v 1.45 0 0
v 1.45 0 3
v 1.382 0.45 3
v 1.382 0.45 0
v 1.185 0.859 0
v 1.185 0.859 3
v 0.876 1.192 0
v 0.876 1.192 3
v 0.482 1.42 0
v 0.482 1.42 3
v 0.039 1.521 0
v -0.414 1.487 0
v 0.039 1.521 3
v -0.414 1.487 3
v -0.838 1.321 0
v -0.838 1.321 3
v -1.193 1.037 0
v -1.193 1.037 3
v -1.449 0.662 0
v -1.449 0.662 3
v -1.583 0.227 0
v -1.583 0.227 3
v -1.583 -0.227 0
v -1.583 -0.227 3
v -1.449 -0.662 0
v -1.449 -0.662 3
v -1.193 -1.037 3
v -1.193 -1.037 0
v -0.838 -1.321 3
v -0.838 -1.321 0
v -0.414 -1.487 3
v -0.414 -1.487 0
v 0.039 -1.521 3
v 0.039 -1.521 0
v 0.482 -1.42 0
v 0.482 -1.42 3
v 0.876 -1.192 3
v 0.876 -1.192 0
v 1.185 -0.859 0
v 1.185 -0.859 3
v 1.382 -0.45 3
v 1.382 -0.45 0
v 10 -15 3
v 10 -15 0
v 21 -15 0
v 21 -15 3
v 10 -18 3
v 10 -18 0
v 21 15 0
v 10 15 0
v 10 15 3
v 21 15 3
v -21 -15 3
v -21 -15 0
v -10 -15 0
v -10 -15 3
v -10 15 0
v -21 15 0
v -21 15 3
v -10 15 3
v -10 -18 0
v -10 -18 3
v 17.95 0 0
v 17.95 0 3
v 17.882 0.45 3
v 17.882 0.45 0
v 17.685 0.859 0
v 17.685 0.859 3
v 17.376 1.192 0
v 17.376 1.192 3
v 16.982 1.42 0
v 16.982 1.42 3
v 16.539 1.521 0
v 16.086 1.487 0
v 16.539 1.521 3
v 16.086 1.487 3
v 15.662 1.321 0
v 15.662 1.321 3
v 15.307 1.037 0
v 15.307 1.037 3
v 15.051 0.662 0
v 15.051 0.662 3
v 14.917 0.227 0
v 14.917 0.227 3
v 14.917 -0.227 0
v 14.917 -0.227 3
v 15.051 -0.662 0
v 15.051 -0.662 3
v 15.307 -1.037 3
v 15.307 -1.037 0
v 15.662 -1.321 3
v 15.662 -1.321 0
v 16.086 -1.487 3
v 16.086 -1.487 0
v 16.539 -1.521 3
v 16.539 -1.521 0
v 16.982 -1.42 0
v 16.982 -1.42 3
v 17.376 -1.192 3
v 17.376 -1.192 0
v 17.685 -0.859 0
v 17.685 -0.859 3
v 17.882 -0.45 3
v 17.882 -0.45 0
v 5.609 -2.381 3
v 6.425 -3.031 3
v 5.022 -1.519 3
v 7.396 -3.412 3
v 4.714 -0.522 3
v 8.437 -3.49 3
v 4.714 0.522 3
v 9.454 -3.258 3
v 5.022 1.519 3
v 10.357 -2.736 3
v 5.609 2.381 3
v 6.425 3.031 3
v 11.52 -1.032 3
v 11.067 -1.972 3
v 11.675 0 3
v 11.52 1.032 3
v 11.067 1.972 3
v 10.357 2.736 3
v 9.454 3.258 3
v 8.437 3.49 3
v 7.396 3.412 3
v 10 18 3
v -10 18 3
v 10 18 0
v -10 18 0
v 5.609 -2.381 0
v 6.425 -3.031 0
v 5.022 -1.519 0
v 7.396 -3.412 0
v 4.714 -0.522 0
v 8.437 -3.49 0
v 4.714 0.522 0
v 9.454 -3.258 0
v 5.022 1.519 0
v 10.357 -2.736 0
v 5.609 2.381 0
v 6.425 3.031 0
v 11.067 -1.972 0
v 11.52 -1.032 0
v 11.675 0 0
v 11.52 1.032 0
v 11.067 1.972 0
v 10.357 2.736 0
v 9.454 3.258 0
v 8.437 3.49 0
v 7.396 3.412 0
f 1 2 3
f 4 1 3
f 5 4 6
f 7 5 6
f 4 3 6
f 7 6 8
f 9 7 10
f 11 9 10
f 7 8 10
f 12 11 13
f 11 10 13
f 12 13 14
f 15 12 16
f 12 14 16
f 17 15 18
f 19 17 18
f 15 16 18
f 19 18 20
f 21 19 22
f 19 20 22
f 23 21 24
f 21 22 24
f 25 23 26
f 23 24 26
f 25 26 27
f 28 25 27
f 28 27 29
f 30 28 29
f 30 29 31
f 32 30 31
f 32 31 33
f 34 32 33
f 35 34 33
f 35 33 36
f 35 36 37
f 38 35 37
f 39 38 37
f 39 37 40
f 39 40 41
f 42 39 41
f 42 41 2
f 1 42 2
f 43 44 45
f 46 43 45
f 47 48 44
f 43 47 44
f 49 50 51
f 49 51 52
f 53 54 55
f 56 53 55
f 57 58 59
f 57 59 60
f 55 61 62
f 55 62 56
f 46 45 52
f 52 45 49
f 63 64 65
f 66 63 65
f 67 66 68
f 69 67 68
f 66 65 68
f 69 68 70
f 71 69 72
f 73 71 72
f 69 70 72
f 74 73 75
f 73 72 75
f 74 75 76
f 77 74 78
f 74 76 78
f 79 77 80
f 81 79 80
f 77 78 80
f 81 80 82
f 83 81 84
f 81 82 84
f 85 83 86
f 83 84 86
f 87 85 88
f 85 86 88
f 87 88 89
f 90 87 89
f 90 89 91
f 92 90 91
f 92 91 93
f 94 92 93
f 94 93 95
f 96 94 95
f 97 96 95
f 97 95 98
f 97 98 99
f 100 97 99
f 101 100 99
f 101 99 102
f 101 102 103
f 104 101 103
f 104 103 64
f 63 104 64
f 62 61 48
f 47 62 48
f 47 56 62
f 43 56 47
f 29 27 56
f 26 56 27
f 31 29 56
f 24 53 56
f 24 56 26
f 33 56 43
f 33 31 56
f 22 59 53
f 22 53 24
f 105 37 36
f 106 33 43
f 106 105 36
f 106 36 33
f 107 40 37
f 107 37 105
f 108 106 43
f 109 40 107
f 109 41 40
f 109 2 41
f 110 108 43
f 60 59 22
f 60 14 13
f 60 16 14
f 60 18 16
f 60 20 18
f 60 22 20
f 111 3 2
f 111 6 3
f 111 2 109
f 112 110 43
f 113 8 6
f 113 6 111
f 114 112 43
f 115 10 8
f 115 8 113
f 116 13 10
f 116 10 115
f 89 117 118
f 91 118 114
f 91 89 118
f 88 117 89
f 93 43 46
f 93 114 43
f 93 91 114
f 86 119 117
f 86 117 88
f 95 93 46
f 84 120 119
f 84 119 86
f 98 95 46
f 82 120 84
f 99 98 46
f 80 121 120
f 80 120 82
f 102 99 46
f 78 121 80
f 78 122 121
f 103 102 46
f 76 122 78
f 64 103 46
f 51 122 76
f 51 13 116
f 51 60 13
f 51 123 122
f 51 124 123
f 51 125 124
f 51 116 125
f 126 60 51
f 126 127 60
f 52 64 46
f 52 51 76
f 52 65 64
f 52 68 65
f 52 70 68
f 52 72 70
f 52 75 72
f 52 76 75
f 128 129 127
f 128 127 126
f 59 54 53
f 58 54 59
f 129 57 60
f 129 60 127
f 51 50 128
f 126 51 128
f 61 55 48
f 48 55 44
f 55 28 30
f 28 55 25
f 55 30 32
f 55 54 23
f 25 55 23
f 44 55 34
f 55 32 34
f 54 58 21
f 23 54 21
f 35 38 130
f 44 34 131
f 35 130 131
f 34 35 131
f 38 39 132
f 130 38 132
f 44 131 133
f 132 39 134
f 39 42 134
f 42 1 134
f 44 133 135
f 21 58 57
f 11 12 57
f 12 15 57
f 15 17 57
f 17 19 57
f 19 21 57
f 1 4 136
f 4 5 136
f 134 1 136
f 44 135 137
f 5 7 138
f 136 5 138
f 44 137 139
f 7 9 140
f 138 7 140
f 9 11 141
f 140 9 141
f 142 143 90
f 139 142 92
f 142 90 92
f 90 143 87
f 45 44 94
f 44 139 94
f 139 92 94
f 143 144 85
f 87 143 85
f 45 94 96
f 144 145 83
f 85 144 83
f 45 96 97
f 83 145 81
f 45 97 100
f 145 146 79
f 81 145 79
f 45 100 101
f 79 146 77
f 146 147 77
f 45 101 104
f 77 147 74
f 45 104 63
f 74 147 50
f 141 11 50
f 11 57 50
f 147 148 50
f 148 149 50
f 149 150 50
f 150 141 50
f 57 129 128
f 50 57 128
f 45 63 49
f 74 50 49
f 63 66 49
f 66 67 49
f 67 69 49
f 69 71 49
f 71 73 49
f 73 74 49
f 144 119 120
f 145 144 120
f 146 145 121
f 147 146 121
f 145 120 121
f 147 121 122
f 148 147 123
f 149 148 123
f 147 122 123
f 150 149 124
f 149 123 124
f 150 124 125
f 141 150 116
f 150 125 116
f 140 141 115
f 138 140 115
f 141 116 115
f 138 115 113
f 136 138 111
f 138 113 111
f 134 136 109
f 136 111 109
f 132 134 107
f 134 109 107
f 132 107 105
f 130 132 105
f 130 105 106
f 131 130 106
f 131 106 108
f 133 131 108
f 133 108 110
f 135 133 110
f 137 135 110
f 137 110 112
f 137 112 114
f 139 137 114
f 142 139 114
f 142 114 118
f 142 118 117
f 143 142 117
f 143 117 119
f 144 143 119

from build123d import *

# Parameters (mm, degrees)
SKETCH1_W           = 42
SKETCH1_H           = 30
SKETCH1_W_2         = 20
SKETCH1_H_2         = 3
BOSS_EXTRUDE1_DEPTH = 3
SKETCH2_R           = 3.5
SKETCH2_R_2         = 1.525
CUT_EXTRUDE1_DEPTH  = 4


with BuildPart() as part:
    # Sketch1 → Boss-Extrude1 (new body)
    with BuildSketch(Plane.XY):
        Rectangle(SKETCH1_W, SKETCH1_H)
        with Locations((0, 16.5)):
            Rectangle(SKETCH1_W_2, SKETCH1_H_2)
        with Locations((0, -16.5)):
            Rectangle(SKETCH1_W_2, SKETCH1_H_2)
    extrude(amount=BOSS_EXTRUDE1_DEPTH)

    # Sketch2 → Cut-Extrude1 (cut, through all)
    with BuildSketch(Plane.XY.offset(3)):
        with Locations((8.175, 0)):
            Circle(SKETCH2_R)
        with Locations((16.425, 0)):
            Circle(SKETCH2_R_2)
        with Locations((-0.075, 0)):
            Circle(SKETCH2_R_2)
    extrude(amount=-CUT_EXTRUDE1_DEPTH, mode=Mode.SUBTRACT)


solid = part.part
